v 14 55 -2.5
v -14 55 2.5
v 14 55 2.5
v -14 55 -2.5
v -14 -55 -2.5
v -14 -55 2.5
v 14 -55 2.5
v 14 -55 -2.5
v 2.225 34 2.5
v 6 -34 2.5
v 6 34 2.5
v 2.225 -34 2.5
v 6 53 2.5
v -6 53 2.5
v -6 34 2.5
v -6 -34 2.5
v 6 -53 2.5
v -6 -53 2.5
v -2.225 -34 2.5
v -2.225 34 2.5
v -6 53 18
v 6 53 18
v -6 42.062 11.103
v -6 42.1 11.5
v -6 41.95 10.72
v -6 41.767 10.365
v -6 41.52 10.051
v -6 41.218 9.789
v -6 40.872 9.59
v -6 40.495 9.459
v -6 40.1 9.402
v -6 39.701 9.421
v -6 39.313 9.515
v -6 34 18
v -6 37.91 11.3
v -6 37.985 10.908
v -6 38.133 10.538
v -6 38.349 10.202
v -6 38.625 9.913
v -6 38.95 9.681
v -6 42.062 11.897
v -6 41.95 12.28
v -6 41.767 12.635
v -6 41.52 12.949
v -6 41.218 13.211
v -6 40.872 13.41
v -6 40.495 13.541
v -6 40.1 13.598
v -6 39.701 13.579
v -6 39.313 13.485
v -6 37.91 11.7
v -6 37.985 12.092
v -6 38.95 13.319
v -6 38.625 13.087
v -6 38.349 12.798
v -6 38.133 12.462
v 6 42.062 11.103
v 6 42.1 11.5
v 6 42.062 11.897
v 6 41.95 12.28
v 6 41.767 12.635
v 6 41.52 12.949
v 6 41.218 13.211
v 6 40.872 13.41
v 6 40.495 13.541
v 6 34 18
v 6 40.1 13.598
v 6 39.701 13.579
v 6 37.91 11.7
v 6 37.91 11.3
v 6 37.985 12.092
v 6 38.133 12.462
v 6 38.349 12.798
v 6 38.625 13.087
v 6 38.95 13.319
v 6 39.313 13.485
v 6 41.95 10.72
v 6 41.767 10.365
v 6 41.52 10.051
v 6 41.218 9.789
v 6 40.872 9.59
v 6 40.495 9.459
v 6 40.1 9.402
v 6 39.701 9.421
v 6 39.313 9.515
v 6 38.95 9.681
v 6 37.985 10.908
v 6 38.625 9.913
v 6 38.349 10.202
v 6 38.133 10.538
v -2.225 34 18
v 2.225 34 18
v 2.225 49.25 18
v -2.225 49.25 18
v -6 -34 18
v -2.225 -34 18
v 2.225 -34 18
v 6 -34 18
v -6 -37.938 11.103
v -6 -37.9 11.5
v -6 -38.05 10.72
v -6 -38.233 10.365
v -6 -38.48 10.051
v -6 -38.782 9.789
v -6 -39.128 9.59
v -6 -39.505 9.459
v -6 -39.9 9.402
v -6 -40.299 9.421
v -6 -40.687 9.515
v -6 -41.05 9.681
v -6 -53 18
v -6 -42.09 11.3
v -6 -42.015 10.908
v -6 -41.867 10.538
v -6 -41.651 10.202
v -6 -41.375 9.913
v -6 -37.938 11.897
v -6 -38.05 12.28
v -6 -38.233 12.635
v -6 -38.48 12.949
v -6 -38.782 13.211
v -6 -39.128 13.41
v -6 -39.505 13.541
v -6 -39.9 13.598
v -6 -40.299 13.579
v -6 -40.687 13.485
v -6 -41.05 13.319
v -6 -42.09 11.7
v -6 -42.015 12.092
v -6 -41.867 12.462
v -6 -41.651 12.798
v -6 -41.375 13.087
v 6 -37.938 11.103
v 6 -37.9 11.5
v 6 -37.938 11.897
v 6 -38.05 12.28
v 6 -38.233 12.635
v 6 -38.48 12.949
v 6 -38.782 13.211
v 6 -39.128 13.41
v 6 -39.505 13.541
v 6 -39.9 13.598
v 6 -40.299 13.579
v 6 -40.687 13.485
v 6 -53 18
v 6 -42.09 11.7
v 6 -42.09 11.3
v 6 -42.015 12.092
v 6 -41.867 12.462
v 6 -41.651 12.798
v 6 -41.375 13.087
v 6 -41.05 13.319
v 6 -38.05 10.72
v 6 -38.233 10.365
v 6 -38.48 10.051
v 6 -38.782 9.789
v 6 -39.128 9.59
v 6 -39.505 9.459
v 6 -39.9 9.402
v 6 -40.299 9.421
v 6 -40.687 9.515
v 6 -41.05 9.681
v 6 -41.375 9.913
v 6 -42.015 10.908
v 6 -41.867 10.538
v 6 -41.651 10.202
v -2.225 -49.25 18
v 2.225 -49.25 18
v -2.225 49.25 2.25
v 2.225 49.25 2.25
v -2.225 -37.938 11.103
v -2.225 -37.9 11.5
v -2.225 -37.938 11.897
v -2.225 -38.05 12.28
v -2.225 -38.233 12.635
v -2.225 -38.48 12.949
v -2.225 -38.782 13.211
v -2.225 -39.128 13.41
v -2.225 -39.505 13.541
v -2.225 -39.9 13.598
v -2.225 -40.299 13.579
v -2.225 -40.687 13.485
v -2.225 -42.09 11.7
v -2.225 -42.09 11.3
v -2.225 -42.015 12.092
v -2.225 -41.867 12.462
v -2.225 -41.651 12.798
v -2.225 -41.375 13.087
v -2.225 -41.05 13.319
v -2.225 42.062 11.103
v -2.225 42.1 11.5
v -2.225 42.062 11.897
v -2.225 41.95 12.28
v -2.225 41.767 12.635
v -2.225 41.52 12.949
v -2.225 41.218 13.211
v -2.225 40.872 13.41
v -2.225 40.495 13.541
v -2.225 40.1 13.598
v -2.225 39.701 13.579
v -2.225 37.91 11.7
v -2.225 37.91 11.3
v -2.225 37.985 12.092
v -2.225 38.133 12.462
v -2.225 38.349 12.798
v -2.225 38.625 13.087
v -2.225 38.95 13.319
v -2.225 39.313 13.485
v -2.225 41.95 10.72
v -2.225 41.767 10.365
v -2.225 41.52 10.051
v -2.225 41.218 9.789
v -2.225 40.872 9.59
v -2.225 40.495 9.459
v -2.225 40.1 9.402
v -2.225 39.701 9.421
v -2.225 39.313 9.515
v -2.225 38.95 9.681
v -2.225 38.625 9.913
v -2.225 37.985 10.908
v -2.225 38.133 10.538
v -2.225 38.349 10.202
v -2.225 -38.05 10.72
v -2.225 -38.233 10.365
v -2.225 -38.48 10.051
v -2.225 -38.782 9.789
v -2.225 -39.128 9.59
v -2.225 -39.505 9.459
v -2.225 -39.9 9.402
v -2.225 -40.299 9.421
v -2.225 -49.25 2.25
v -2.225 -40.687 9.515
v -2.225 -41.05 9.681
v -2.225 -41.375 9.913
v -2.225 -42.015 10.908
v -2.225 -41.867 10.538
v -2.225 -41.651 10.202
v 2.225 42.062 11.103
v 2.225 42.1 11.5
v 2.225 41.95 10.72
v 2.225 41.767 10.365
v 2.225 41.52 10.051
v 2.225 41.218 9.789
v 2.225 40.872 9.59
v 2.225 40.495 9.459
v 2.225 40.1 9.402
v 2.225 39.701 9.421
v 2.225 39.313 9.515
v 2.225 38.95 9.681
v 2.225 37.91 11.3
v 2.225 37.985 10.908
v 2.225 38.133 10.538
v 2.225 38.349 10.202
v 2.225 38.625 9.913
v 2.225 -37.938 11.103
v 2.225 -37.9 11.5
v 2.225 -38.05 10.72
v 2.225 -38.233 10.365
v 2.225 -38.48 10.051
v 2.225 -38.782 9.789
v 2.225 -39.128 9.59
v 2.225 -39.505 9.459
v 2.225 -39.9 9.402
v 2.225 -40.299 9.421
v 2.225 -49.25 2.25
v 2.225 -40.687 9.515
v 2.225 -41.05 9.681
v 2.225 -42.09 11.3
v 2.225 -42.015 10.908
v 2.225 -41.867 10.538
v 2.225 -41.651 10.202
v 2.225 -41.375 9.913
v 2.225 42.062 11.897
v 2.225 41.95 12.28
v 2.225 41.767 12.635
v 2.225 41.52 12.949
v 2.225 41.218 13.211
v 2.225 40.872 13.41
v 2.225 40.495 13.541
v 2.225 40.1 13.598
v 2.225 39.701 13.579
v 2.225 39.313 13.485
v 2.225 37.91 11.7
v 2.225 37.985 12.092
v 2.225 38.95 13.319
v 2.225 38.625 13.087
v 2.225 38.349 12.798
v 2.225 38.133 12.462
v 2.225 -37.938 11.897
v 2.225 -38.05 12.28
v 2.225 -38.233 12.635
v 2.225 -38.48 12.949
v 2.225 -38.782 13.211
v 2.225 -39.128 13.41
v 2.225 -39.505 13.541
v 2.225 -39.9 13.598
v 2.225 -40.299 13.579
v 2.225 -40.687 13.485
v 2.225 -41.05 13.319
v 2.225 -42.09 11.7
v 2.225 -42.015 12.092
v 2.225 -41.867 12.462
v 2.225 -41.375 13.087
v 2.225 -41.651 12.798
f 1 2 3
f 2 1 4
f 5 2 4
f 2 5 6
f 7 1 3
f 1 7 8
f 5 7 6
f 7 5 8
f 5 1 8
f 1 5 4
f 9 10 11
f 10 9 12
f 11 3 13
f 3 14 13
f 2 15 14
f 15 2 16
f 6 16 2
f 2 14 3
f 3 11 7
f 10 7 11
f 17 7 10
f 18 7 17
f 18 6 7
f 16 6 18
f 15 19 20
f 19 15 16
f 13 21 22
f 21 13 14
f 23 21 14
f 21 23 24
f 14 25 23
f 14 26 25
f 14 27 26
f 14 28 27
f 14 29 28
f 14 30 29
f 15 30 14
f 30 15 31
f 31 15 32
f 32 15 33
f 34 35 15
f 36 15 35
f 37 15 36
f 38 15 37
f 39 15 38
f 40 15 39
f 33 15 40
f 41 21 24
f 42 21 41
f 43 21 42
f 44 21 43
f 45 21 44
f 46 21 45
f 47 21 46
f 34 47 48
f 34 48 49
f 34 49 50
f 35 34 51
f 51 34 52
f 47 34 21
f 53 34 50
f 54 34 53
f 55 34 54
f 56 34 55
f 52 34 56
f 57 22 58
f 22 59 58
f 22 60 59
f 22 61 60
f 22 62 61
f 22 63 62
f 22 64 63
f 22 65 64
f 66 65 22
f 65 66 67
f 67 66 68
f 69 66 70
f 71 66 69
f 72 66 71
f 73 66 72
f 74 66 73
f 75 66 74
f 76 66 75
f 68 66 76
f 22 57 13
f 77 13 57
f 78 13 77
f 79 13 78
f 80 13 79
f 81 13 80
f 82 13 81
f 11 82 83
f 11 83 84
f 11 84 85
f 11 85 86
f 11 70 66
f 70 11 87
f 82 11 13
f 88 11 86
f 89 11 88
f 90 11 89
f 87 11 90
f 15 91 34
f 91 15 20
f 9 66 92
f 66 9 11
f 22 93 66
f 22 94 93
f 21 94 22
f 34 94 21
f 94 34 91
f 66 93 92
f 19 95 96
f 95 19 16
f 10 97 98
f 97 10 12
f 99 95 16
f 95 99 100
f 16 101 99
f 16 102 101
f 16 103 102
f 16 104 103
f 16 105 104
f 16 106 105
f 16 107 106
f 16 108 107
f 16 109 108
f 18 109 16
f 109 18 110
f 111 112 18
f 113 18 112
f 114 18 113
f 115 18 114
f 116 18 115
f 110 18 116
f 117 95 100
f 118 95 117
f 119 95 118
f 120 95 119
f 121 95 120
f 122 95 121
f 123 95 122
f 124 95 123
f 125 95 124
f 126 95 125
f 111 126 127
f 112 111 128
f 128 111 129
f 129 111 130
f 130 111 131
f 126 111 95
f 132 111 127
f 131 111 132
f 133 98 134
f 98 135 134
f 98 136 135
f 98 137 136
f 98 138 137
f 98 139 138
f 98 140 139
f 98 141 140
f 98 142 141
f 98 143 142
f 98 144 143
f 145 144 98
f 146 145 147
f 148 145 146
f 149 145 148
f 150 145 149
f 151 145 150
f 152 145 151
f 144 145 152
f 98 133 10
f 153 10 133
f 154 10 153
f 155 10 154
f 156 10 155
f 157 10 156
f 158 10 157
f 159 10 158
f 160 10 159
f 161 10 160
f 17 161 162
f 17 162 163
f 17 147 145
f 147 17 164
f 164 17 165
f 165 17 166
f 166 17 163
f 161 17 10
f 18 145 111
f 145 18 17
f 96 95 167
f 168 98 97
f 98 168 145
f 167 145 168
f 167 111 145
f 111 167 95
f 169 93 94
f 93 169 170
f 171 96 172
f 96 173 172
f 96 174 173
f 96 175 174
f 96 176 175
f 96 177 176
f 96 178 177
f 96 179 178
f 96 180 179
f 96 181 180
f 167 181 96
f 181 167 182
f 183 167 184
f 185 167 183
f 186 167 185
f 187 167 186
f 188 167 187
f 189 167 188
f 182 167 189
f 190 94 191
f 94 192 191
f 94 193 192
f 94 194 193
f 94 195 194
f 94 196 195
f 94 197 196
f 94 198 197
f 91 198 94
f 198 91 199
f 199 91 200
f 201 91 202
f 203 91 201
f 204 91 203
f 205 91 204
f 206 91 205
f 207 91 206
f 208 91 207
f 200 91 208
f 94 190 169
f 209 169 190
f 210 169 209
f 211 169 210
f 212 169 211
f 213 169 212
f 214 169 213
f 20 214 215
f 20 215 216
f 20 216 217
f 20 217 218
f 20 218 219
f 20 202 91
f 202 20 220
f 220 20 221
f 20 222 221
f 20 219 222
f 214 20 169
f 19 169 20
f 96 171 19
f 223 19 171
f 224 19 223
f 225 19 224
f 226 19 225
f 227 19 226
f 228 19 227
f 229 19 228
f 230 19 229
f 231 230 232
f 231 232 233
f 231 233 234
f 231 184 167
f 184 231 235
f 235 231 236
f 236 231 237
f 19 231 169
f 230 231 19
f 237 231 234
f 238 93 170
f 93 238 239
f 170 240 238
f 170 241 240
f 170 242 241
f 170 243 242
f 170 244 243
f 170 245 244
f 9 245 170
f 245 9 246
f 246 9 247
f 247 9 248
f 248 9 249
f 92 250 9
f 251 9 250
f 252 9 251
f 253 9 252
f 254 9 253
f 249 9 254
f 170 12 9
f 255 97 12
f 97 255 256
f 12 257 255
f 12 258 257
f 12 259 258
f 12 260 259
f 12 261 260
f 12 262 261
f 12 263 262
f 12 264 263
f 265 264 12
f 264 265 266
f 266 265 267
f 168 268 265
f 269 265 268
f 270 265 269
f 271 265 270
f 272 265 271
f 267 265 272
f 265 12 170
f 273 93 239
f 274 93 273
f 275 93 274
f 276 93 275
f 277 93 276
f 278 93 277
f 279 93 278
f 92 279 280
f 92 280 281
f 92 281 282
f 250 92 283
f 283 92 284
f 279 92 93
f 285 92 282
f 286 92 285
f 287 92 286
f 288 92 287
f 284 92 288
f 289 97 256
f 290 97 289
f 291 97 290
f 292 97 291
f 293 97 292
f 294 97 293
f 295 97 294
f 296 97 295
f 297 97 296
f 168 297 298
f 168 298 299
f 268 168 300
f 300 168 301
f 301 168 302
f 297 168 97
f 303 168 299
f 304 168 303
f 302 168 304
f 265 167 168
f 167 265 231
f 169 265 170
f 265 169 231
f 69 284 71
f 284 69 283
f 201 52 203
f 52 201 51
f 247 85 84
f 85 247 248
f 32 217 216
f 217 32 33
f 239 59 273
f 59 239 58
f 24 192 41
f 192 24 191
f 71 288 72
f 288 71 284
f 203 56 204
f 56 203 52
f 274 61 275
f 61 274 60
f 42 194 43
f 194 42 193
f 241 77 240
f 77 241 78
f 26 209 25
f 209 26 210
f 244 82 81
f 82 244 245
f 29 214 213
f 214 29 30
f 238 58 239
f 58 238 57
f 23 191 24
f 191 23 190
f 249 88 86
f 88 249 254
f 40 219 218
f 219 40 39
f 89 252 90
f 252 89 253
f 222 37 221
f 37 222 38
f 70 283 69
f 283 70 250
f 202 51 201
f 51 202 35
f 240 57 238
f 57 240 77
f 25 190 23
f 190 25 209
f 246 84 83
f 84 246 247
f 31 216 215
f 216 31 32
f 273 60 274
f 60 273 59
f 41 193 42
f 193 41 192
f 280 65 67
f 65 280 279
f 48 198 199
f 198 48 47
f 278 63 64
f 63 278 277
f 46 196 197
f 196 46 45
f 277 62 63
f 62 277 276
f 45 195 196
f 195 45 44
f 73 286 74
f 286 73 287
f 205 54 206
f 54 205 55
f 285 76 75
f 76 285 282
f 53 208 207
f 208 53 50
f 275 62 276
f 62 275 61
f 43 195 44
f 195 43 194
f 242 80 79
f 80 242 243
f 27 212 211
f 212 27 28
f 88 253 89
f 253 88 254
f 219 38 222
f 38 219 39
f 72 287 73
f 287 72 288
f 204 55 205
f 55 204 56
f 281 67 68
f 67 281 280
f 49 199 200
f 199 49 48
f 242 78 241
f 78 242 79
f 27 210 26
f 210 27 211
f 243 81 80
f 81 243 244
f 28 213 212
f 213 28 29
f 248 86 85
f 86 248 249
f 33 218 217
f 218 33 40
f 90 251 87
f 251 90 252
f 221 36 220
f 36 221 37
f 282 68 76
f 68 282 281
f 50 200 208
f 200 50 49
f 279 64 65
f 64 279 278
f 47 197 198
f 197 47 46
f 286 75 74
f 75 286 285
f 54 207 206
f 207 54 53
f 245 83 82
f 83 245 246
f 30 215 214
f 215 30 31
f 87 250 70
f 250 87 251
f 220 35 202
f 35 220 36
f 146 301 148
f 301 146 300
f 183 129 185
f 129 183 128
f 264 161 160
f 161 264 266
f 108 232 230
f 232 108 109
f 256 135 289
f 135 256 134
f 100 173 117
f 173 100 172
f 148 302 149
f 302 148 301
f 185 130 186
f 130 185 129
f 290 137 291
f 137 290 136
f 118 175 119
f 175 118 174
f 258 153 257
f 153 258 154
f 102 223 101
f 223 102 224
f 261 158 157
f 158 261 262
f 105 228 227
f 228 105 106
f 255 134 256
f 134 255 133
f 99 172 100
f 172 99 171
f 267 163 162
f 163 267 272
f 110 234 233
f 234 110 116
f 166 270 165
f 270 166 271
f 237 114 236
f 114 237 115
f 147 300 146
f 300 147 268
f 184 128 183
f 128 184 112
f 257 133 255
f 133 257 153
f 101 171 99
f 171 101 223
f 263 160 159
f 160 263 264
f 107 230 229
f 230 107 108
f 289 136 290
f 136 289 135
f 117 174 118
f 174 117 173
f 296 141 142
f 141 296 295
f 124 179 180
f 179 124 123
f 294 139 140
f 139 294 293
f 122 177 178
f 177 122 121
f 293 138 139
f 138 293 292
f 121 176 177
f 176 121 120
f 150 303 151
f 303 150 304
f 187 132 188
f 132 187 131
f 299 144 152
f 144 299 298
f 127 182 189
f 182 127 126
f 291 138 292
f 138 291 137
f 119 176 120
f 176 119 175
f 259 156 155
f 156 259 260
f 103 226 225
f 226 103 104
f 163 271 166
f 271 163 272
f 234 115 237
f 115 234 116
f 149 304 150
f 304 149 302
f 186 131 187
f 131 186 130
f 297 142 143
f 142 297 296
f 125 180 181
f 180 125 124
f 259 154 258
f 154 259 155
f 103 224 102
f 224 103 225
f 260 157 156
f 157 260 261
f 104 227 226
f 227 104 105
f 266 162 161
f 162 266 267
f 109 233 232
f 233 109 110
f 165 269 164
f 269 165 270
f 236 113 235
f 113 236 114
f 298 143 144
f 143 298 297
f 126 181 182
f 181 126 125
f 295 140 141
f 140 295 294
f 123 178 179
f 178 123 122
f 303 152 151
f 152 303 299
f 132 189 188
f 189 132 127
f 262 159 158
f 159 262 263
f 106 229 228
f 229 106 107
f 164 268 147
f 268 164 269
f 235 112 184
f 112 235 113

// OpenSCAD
include <MCAD/bearing.scad>

// ---------------------------
// Constants
// ---------------------------
$fa = 1;
$fs = 0.4;
in_to_mm = 25.4;
gap = 1.25; //1/32 * in_to_mm;
nut_gap = 7;//3/4 * in_to_mm;
eps = .15;

bearingModel = 688; //608
bearing_w = bearingWidth(bearingModel);
bearing_or = bearingOuterDiameter(bearingModel)/2;
bearing_ir = bearingInnerDiameter(bearingModel)/2;


// ---------------------------
// Variables
// ---------------------------
num_holes=12;
sectors = num_holes;
sector_degrees = 360 / sectors;

mag1_hole_d = (1/4 * in_to_mm);
mag1_hole_r = (mag1_hole_d/2);
mag1_w = 1/4 * in_to_mm;

mag2_hole_d = (1/8 * in_to_mm);
mag2_hole_r = (mag2_hole_d/2);
mag2_w = 1/4 * in_to_mm;

mag_space_1 = 3;
mag_space_2 = 2;

cir = num_holes*2*(mag1_hole_d-mag_space_2/2);
temp_r = cir/(3.14159*2);
min_r = bearing_or + mag1_hole_d + mag2_hole_d + mag_space_2+3;
central_r3 = max(temp_r, min_r);
central_r2 = central_r3 + mag2_hole_r + mag_space_2 + mag2_hole_r;
central_r = central_r2 + mag2_hole_r + mag_space_1 + mag1_hole_r;
disk_r = central_r+2;

coil_cap_w = .6;
coil_w = bearing_w-1;//5;//(1/8 * in_to_mm = 3.175);
coil_hole_r = mag1_hole_r*3;
coil_hole_d = coil_hole_r*2;
coil_holder_r = mag1_hole_r;
coil_holder_bolt_r = 2;
coil_holder_top_insert_h = 1;
coil_holder_inner_shell_t = 2;
coil_holder_center_cyl_t = 1.5;
coil_center_hole_r = bearing_or+eps; //7

coil_holder_hull_r = 1;
coil_holder_out_r1 = central_r3-mag1_hole_r-mag2_hole_r-mag_space_2;
coil_holder_out_x1 = coil_holder_out_r1-coil_holder_hull_r/num_holes;
coil_holder_out_y1 = mag1_hole_r-coil_holder_hull_r;
coil_holder_out_r2 = central_r+mag1_hole_d+mag_space_1;
coil_holder_out_x2 = coil_holder_out_r2+mag1_hole_r-coil_holder_hull_r*4;
coil_holder_out_y2 = mag1_hole_r-coil_holder_hull_r;

coil_holder_in_x1 = coil_holder_out_r1+mag1_hole_r+coil_holder_hull_r/2;
coil_holder_in_y1 = mag1_hole_r+coil_holder_hull_r;
coil_holder_in_x2 = coil_holder_out_r2-mag1_hole_r-coil_holder_hull_r*2;
coil_holder_in_y2 = mag1_hole_r+coil_holder_hull_r;
coil_holder_in_len = coil_holder_in_x2 - coil_holder_in_x1 + coil_holder_hull_r*2;
coil_holder_center_r = coil_holder_out_x1 + (coil_holder_out_x2 - coil_holder_out_x1)/2;
echo(str("coil_holder_in_len:", coil_holder_in_len));

base_d = 100;
base_r = base_d/2;  //central_r + coil_hole_d;
base_w = 3; //bearing_w/1.75
base_l = 70; //3.5 * in_to_mm; 66.4
base_lc = nut_gap + gap + mag2_w + gap + coil_w +gap + mag1_w + gap + coil_w + gap + mag1_w + gap + coil_w + gap + mag2_w + gap + nut_gap;
base_side_h = 15;
alignment_bolt_r = 3.9/2;

axel_h = gap+coil_w+gap;
axel_ir = bearing_ir+.1;
axel_or = coil_center_hole_r-1;

echo(str("sector_degrees:", sector_degrees));
echo(str("coil_w:", coil_w));
echo(str("bearing_w:", bearing_w));
echo(str("mag1_w:", mag1_w));
echo(str("mag1_hole_r:", mag1_hole_r));
echo(str("disk_r:", disk_r));

render_mode = "PRINT"; //"FULL", "PRINT", "TEST";
print_mode = "BASE"; //"MAG1","COIL","HOLDERS","BASE";

// Main rendering code
if (render_mode=="FULL") {
    renderFull();
} else if (render_mode=="PRINT") {
    renderPrint();
} else if (render_mode=="TEST") {
    renderTest();
}

module renderFull() {
    rotate([-90,0,90]) {
        // Coil Disk
        coilDisk(diskNum=1, bearing=true);
        // Base
        base();
        // Rotating Magnet Disks
        z_offset = (mag1_w + bearing_w)/2;
        inv_num_holes = 1/num_holes;
        tmp_t = inv_num_holes*2; //0=blue, 1=white, 2=yellow, 3=green
        rotate([0,0,(-sector_degrees/(num_holes/2))*$t*num_holes]) {
        //rotate([0,0,(-sector_degrees/(num_holes/2))*tmp_t*num_holes]) {
            translate([0,0,z_offset])
            %mag1Disk();
            translate([0,0,-z_offset])
            %mag1Disk();
        }

        // Coil Holders - Yellow
        tr1=1;//3/num_holes;//0.0;//0.125;
        color( "yellow", 1.0 ) {
            rotate([0,0,(-sector_degrees/2)*tr1]) {
                translate([0,0,-coil_w/2])coilHoldersVisual();
            }
        }
    //    tr2=0.5;
    //    color( "white", 1.0 ) {
    //        rotate([0,0,(-sector_degrees/2)*tr2]) {
    //            coilHoldersVisual();
    //        }
    //    }
    //    tr3=1.5;
    //    color( "green", 1.0 ) {
    //        rotate([0,0,(-sector_degrees/2)*tr3]) {
    //            coilHoldersVisual();        
    //        }
    //    }
    //    tr4=2;
    //    color( "blue", 1.0 ) {
    //        rotate([0,0,(-sector_degrees/2)*tr4]) {    
    //            coilHoldersVisual();    
    //        }
    //    } 
    }
}

module renderPrint() {
    if (print_mode=="MAG1") {
        // Magnet Disk1
        mag1Disk();
    } else if (print_mode=="COIL") {
        // COIL Disk
        if (num_holes==12) {
            coilDisk(diskNum=3);
        } else {
            coilDisk();
        }
    } else if (print_mode=="HOLDERS") {
        // Wire coil holders
        printCoilHolderTopAndBot();
    } else if (print_mode=="BASE") {
        // Base
        basePrint();
    }
}

// ---------------------------------------
// Stationary Coil Disk Modules
// ---------------------------------------

// Stationary Disk with trapezoid coils
module coilDisk(w=coil_w, diskNum=1, wires=true, bearing=false) {
    x = base_d-1.5;
    y = x;
    small_hole_r = 1;
    small_hole_or = central_r+mag1_hole_d+coil_hole_r-5;
    // Disk
    difference() {
        //main structure
        cube([x, y, w], center=true);
        //remove trapezoids for coils
        rotate([0,0,(-sector_degrees/2)*diskNum]) {
            translate([0,0,-w])coilHoldersOutline(w=w*2,offset_r=eps);
        }
        // remove center hole for bearing
        cylinder(h=w*2,r=coil_center_hole_r,center=true);
        // remove holes for wires
        if (wires == true) {
            //wireChannelsStraight();
            structureHoles(w=w,radius=small_hole_or, hole_r=small_hole_r);
        }
        alignmentBoltHoles(w=w);
    }
    if (bearing == true) {
        translate([0, 0, -bearing_w/2])
        bearing(model=bearingModel, outline=false);
    }
}

//alignment_bolt_r
module alignmentBoltHoles(w=coil_w, r=alignment_bolt_r, i=10) {
    translate([base_r-i,base_r-i,0])cylinder(h=w*2,r=r,center=true);
    translate([-base_r+i,base_r-i,0])cylinder(h=w*2,r=r,center=true);
    translate([base_r-i,-base_r+i,0])cylinder(h=w*2,r=r,center=true);
    translate([-base_r+i,-base_r+i,0])cylinder(h=w*2,r=r,center=true);
}

module wireChannelsStraight() {
    radius = central_r+mag1_hole_d;
    sectors = num_holes/2;
    degrees = 360 / sectors;
    cyl_h = radius*(12/num_holes)-2;
    
    for(sector = [1 : sectors]) {
        angle = degrees * sector;
        x_pos = radius * sin(angle);
        y_pos = radius * cos(angle);
        x_off = (coil_hole_r) * cos(angle);
        y_off = (coil_hole_r) * sin(angle);
        cross_angle_1 = degrees/2-(angle+90);
        cross_angle_2 = degrees/2-(angle+degrees-90);
        rotate([0,0,degrees/2]) {
            translate([x_pos+y_off,y_pos+x_off,coil_w/2]){
                rotate([90,0,cross_angle_1])cylinder(h=cyl_h,r=coil_w/4,center=false);
            }
        }
        rotate([0,0,degrees/2]) {
            translate([x_pos+y_off,y_pos+x_off,coil_w/2]){
                rotate([90,0,cross_angle_2])cylinder(h=cyl_h,r=coil_w/4,center=false);
            }
        }
    }    
}

// ---------------------------------------
// Rotating Magnet Disk Modules
// ---------------------------------------

// Rotating Disk with magnets #1
module mag1Disk(w=mag1_w) {
    border = mag1_hole_r*1.5;
    mag1_disk_r = central_r + border;
    
    // Disk
    difference() {
        cylinder(h=w,r=mag1_disk_r,center=true);
        //remove holes for outer magnets
        holes(w*2, mag1_hole_r+eps);
        //remove holes for center magnets
        holes(w*2, mag2_hole_r+eps, radius=central_r2);
        //remove holes for inner magnets
        holes(w*2, mag2_hole_r+eps, radius=central_r3);
        //remove hole for main axel
        cylinder(h=w*2,r=axel_ir,center=true);
    }
}


// ---------------------------------------
// Coil Holder Modules
// ---------------------------------------

module printCoilHolderTopAndBot() { 
    centerCoilHolder() {
        coilHolderBottom();
    }    
    translate([0,-coil_holder_center_r-2,0])rotate([0,0,180]){
        centerCoilHolder() {
            coilHolderTop();
        }    
    }
}

module centerCoilHolder() { 
    angle = 90-(sector_degrees/2);
    radius = coil_holder_center_r;
    x_pos = radius * sin(angle);
    y_pos = radius * cos(angle);

    translate([-x_pos,-y_pos,0]) children(); 
}

module coilHolderBottom() {
    h=coil_w-coil_cap_w;
    difference() {
        union() {
            coilHolderCap(holes=true);
            innerCoilHolderShell(h=h);
            coilHolderCenterCylinder(h=h);
        }
        coilHolderCenterBoltHole();
    }
}

module innerCoilHolderShell(h=coil_w) {
    linear_extrude(height=h, slices=10) {
        difference() {
            innerCoilHolder2d();
            offset(r=-coil_holder_inner_shell_t) {
                innerCoilHolder2d();
            }
        }
    }
}

module coilHolderTop() {
    difference() {
        union() {
            coilHolderCap();
            coilHolderTopInsert();
        }
        coilHolderCenterCylinder(t=coil_holder_center_cyl_t+eps,z=coil_cap_w);
        coilHolderCenterBoltHole();
    }
}

module coilHolderTopInsert(h=coil_holder_top_insert_h, z=coil_cap_w) {
    translate([0,0,z]) {
        linear_extrude(height=h, slices=1) {
            offset(r=-(coil_holder_inner_shell_t+eps)) {
                innerCoilHolder2d();
            }
        }
    }
}

module coilHolderCap(w=coil_cap_w, holes=false) {
    translate([0,0,w/2])outerCoilHolder(w=w, holes=holes);
}

module coilHolderCenterCylinder(h=coil_w, r=coil_holder_bolt_r, t=coil_holder_center_cyl_t, z=0) {
    rotate([0,0,(sector_degrees/2)])
        translate([coil_holder_center_r,0,z]) 
            cylinder(h=h,r=r+t);
}

module coilHolderCenterBoltHole() {
    coilHolderCenterCylinder(h=coil_w*3,t=eps,z=-coil_w);
}

// Coil Holders Visual
module coilHoldersVisual(w=coil_w) {
    for(sector = [0 : 2 : sectors]) {
        rotate([0,0,sector_degrees*sector]) { 
            outerCoilHolder(w=w);
            #translate([0,0,w/2])innerCoilHolder(w=w+2);
        }
    }    
}

module coilHoldersOutline(w=coil_w, offset_r=0) {
    for(sector = [0 : 2 : sectors]) {
        rotate([0,0,sector_degrees*sector]) { 
            outerCoilHolder(w=w,offset_r=offset_r);
        }
    }    
}

// Outer coil holder
module outerCoilHolder(w=coil_w, offset_r=0, holes=false) {
    difference() {
        linear_extrude(height=w, slices=1) {
            offset(r=offset_r) {
                outerCoilHolder2d();
            }
        }
        if (holes == true) {
            translate([coil_holder_out_x2+mag1_hole_r/1.1, 0, 0])
            cylinder(h=w*2,r=1,center=true);
            rotate([0,0,sector_degrees]) {
                translate([coil_holder_out_x2, 0, 0])
                cylinder(h=w*2,r=1,center=true);
            }
            
        }
    }
}

module outerCoilHolder2d(w=coil_w, offset_r=0) {
    hull() {
        translate([coil_holder_out_x1, -coil_holder_out_y1, 0])
        circle(r=coil_holder_hull_r);
        translate([coil_holder_out_x2, 0, 0])
        circle(r=mag1_hole_r);

        rotate([0,0,sector_degrees]) {
            translate([coil_holder_out_x1, coil_holder_out_y1, 0])
            circle(r=coil_holder_hull_r);
            translate([coil_holder_out_x2, 0, 0])
            circle(r=mag1_hole_r);
        }
    }
}


// Inner coil holder
module innerCoilHolder(w=coil_w) {
    hull() {
        translate([coil_holder_in_x1, coil_holder_in_y1, 0])
        cylinder(h=w,r=coil_holder_hull_r,center=true);
        translate([coil_holder_in_x2, coil_holder_in_y2, 0])
        cylinder(h=w,r=coil_holder_hull_r,center=true);

        rotate([0,0,sector_degrees]) {
        translate([coil_holder_in_x1, -coil_holder_in_y1, 0])
        cylinder(h=w,r=coil_holder_hull_r,center=true);
        translate([coil_holder_in_x2, -coil_holder_in_y2, 0])
        cylinder(h=w,r=coil_holder_hull_r,center=true);
        }
    }
}

// Inner coil holder 2D
module innerCoilHolder2d() {
    hull() {
        translate([coil_holder_in_x1, coil_holder_in_y1, 0])
        circle(r=coil_holder_hull_r);
        translate([coil_holder_in_x2, coil_holder_in_y2, 0])
        circle(r=coil_holder_hull_r);

        rotate([0,0,sector_degrees]) {
        translate([coil_holder_in_x1, -coil_holder_in_y1, 0])
        circle(r=coil_holder_hull_r);
        translate([coil_holder_in_x2, -coil_holder_in_y2, 0])
        circle(r=coil_holder_hull_r);
        }
    }
}

// ---------------------------------------
// Base Related Modules
// ---------------------------------------

module basePrint(base_sup_x = 19, base_sup_y = 18) {
    base_x = base_d+10;
    base_y = coil_w*1.25;
    base_yo = base_r+base_y/2-1;
    w = coil_w + eps*3;
    rotate([-90,0,90])translate([0,-base_yo,0]) {
        base(base_sup_x=base_sup_x, base_sup_y=base_sup_y);
    }
}

module base(base_sup_x = 19, base_sup_y = 18) {
    base_x = base_d+10;
    base_y = coil_w*1.25;
    base_yo = base_r+base_y/2-1;
    w = coil_w + eps*3;
    difference() {
        baseStructure(base_sup_x=base_sup_x, base_sup_y=base_sup_y);
        // Remove COIL Disk
        if (num_holes==12) {
            coilDisk(w=w, diskNum=3);
        } else {
            coilDisk(w=w);
        }
        alignmentBoltHoles(w=w*2,r=alignment_bolt_r+eps);
    }
}

module baseStructure(base_sup_x=19, base_sup_y=18) {
    base_x = base_d+10;
    base_y = coil_w*1.25;
    base_yo = base_r+base_y/2-1;
    base_z = coil_w*7;
    base_sup_xo = (base_x-base_sup_x)/2-2;
    base_sup_yo = base_yo - base_sup_y/2;
    base_sup_z = coil_w*3;
    translate([0,base_yo,0])
    cube([base_x,base_y,base_z], center=true);
    translate([base_sup_xo,base_sup_yo,0])
    cube([base_sup_x,base_sup_y,base_sup_z], center=true);
    translate([-base_sup_xo,base_sup_yo,0])
    cube([base_sup_x,base_sup_y,base_sup_z], center=true);
}

// ---------------------------------------
// Common Modules
// ---------------------------------------

module holes(w, hole_r, radius=central_r) {
    //radius = central_r;
    sectors = num_holes;
    sector_degrees = 360 / sectors;

    for(sector = [1 : sectors]) {
        angle = sector_degrees * sector;
        x_pos = radius * sin(angle);
        y_pos = radius * cos(angle);
        translate([x_pos,y_pos,0]){
            hole(w, hole_r);
        }
    }    
}

module structureHoles(w, radius, hole_r, sectors=num_holes) {
    sector_degrees = 360 / sectors;
    for(sector = [1 : 2 : sectors]) {
        angle = sector_degrees * sector;
        x_pos = radius * sin(angle);
        y_pos = radius * cos(angle);
        translate([x_pos,y_pos,0]){
            hole(w, hole_r);
        }
    }    
}

module hole(w, hole_r) {
    cylinder(h=w+2,r=hole_r,center=true);
}


// ---------------------------------------
// Test Print Module
// ---------------------------------------

module renderTest() {
    translate([0,0,coil_w/2]) {
        difference() {
            translate([0,5,0])cube([50,50,coil_w], center=true);
            
            //Big Magnet hole
            translate([20,25,0])hole(mag1_w, mag1_hole_r+eps); 

            //Small Magnet hole
            translate([20,15,0])hole(mag2_w, mag2_hole_r+eps); 
            
            //Bearing hole
            translate([-15,20,0])
            cylinder(h=bearing_w*2,r=coil_center_hole_r,center=true);
            
            //CoilHolder
            centerCoilHolder() {
                translate([0,0,-coil_w])outerCoilHolder(w=coil_w*2,offset_r=eps);
            }    
        }
    }
}
